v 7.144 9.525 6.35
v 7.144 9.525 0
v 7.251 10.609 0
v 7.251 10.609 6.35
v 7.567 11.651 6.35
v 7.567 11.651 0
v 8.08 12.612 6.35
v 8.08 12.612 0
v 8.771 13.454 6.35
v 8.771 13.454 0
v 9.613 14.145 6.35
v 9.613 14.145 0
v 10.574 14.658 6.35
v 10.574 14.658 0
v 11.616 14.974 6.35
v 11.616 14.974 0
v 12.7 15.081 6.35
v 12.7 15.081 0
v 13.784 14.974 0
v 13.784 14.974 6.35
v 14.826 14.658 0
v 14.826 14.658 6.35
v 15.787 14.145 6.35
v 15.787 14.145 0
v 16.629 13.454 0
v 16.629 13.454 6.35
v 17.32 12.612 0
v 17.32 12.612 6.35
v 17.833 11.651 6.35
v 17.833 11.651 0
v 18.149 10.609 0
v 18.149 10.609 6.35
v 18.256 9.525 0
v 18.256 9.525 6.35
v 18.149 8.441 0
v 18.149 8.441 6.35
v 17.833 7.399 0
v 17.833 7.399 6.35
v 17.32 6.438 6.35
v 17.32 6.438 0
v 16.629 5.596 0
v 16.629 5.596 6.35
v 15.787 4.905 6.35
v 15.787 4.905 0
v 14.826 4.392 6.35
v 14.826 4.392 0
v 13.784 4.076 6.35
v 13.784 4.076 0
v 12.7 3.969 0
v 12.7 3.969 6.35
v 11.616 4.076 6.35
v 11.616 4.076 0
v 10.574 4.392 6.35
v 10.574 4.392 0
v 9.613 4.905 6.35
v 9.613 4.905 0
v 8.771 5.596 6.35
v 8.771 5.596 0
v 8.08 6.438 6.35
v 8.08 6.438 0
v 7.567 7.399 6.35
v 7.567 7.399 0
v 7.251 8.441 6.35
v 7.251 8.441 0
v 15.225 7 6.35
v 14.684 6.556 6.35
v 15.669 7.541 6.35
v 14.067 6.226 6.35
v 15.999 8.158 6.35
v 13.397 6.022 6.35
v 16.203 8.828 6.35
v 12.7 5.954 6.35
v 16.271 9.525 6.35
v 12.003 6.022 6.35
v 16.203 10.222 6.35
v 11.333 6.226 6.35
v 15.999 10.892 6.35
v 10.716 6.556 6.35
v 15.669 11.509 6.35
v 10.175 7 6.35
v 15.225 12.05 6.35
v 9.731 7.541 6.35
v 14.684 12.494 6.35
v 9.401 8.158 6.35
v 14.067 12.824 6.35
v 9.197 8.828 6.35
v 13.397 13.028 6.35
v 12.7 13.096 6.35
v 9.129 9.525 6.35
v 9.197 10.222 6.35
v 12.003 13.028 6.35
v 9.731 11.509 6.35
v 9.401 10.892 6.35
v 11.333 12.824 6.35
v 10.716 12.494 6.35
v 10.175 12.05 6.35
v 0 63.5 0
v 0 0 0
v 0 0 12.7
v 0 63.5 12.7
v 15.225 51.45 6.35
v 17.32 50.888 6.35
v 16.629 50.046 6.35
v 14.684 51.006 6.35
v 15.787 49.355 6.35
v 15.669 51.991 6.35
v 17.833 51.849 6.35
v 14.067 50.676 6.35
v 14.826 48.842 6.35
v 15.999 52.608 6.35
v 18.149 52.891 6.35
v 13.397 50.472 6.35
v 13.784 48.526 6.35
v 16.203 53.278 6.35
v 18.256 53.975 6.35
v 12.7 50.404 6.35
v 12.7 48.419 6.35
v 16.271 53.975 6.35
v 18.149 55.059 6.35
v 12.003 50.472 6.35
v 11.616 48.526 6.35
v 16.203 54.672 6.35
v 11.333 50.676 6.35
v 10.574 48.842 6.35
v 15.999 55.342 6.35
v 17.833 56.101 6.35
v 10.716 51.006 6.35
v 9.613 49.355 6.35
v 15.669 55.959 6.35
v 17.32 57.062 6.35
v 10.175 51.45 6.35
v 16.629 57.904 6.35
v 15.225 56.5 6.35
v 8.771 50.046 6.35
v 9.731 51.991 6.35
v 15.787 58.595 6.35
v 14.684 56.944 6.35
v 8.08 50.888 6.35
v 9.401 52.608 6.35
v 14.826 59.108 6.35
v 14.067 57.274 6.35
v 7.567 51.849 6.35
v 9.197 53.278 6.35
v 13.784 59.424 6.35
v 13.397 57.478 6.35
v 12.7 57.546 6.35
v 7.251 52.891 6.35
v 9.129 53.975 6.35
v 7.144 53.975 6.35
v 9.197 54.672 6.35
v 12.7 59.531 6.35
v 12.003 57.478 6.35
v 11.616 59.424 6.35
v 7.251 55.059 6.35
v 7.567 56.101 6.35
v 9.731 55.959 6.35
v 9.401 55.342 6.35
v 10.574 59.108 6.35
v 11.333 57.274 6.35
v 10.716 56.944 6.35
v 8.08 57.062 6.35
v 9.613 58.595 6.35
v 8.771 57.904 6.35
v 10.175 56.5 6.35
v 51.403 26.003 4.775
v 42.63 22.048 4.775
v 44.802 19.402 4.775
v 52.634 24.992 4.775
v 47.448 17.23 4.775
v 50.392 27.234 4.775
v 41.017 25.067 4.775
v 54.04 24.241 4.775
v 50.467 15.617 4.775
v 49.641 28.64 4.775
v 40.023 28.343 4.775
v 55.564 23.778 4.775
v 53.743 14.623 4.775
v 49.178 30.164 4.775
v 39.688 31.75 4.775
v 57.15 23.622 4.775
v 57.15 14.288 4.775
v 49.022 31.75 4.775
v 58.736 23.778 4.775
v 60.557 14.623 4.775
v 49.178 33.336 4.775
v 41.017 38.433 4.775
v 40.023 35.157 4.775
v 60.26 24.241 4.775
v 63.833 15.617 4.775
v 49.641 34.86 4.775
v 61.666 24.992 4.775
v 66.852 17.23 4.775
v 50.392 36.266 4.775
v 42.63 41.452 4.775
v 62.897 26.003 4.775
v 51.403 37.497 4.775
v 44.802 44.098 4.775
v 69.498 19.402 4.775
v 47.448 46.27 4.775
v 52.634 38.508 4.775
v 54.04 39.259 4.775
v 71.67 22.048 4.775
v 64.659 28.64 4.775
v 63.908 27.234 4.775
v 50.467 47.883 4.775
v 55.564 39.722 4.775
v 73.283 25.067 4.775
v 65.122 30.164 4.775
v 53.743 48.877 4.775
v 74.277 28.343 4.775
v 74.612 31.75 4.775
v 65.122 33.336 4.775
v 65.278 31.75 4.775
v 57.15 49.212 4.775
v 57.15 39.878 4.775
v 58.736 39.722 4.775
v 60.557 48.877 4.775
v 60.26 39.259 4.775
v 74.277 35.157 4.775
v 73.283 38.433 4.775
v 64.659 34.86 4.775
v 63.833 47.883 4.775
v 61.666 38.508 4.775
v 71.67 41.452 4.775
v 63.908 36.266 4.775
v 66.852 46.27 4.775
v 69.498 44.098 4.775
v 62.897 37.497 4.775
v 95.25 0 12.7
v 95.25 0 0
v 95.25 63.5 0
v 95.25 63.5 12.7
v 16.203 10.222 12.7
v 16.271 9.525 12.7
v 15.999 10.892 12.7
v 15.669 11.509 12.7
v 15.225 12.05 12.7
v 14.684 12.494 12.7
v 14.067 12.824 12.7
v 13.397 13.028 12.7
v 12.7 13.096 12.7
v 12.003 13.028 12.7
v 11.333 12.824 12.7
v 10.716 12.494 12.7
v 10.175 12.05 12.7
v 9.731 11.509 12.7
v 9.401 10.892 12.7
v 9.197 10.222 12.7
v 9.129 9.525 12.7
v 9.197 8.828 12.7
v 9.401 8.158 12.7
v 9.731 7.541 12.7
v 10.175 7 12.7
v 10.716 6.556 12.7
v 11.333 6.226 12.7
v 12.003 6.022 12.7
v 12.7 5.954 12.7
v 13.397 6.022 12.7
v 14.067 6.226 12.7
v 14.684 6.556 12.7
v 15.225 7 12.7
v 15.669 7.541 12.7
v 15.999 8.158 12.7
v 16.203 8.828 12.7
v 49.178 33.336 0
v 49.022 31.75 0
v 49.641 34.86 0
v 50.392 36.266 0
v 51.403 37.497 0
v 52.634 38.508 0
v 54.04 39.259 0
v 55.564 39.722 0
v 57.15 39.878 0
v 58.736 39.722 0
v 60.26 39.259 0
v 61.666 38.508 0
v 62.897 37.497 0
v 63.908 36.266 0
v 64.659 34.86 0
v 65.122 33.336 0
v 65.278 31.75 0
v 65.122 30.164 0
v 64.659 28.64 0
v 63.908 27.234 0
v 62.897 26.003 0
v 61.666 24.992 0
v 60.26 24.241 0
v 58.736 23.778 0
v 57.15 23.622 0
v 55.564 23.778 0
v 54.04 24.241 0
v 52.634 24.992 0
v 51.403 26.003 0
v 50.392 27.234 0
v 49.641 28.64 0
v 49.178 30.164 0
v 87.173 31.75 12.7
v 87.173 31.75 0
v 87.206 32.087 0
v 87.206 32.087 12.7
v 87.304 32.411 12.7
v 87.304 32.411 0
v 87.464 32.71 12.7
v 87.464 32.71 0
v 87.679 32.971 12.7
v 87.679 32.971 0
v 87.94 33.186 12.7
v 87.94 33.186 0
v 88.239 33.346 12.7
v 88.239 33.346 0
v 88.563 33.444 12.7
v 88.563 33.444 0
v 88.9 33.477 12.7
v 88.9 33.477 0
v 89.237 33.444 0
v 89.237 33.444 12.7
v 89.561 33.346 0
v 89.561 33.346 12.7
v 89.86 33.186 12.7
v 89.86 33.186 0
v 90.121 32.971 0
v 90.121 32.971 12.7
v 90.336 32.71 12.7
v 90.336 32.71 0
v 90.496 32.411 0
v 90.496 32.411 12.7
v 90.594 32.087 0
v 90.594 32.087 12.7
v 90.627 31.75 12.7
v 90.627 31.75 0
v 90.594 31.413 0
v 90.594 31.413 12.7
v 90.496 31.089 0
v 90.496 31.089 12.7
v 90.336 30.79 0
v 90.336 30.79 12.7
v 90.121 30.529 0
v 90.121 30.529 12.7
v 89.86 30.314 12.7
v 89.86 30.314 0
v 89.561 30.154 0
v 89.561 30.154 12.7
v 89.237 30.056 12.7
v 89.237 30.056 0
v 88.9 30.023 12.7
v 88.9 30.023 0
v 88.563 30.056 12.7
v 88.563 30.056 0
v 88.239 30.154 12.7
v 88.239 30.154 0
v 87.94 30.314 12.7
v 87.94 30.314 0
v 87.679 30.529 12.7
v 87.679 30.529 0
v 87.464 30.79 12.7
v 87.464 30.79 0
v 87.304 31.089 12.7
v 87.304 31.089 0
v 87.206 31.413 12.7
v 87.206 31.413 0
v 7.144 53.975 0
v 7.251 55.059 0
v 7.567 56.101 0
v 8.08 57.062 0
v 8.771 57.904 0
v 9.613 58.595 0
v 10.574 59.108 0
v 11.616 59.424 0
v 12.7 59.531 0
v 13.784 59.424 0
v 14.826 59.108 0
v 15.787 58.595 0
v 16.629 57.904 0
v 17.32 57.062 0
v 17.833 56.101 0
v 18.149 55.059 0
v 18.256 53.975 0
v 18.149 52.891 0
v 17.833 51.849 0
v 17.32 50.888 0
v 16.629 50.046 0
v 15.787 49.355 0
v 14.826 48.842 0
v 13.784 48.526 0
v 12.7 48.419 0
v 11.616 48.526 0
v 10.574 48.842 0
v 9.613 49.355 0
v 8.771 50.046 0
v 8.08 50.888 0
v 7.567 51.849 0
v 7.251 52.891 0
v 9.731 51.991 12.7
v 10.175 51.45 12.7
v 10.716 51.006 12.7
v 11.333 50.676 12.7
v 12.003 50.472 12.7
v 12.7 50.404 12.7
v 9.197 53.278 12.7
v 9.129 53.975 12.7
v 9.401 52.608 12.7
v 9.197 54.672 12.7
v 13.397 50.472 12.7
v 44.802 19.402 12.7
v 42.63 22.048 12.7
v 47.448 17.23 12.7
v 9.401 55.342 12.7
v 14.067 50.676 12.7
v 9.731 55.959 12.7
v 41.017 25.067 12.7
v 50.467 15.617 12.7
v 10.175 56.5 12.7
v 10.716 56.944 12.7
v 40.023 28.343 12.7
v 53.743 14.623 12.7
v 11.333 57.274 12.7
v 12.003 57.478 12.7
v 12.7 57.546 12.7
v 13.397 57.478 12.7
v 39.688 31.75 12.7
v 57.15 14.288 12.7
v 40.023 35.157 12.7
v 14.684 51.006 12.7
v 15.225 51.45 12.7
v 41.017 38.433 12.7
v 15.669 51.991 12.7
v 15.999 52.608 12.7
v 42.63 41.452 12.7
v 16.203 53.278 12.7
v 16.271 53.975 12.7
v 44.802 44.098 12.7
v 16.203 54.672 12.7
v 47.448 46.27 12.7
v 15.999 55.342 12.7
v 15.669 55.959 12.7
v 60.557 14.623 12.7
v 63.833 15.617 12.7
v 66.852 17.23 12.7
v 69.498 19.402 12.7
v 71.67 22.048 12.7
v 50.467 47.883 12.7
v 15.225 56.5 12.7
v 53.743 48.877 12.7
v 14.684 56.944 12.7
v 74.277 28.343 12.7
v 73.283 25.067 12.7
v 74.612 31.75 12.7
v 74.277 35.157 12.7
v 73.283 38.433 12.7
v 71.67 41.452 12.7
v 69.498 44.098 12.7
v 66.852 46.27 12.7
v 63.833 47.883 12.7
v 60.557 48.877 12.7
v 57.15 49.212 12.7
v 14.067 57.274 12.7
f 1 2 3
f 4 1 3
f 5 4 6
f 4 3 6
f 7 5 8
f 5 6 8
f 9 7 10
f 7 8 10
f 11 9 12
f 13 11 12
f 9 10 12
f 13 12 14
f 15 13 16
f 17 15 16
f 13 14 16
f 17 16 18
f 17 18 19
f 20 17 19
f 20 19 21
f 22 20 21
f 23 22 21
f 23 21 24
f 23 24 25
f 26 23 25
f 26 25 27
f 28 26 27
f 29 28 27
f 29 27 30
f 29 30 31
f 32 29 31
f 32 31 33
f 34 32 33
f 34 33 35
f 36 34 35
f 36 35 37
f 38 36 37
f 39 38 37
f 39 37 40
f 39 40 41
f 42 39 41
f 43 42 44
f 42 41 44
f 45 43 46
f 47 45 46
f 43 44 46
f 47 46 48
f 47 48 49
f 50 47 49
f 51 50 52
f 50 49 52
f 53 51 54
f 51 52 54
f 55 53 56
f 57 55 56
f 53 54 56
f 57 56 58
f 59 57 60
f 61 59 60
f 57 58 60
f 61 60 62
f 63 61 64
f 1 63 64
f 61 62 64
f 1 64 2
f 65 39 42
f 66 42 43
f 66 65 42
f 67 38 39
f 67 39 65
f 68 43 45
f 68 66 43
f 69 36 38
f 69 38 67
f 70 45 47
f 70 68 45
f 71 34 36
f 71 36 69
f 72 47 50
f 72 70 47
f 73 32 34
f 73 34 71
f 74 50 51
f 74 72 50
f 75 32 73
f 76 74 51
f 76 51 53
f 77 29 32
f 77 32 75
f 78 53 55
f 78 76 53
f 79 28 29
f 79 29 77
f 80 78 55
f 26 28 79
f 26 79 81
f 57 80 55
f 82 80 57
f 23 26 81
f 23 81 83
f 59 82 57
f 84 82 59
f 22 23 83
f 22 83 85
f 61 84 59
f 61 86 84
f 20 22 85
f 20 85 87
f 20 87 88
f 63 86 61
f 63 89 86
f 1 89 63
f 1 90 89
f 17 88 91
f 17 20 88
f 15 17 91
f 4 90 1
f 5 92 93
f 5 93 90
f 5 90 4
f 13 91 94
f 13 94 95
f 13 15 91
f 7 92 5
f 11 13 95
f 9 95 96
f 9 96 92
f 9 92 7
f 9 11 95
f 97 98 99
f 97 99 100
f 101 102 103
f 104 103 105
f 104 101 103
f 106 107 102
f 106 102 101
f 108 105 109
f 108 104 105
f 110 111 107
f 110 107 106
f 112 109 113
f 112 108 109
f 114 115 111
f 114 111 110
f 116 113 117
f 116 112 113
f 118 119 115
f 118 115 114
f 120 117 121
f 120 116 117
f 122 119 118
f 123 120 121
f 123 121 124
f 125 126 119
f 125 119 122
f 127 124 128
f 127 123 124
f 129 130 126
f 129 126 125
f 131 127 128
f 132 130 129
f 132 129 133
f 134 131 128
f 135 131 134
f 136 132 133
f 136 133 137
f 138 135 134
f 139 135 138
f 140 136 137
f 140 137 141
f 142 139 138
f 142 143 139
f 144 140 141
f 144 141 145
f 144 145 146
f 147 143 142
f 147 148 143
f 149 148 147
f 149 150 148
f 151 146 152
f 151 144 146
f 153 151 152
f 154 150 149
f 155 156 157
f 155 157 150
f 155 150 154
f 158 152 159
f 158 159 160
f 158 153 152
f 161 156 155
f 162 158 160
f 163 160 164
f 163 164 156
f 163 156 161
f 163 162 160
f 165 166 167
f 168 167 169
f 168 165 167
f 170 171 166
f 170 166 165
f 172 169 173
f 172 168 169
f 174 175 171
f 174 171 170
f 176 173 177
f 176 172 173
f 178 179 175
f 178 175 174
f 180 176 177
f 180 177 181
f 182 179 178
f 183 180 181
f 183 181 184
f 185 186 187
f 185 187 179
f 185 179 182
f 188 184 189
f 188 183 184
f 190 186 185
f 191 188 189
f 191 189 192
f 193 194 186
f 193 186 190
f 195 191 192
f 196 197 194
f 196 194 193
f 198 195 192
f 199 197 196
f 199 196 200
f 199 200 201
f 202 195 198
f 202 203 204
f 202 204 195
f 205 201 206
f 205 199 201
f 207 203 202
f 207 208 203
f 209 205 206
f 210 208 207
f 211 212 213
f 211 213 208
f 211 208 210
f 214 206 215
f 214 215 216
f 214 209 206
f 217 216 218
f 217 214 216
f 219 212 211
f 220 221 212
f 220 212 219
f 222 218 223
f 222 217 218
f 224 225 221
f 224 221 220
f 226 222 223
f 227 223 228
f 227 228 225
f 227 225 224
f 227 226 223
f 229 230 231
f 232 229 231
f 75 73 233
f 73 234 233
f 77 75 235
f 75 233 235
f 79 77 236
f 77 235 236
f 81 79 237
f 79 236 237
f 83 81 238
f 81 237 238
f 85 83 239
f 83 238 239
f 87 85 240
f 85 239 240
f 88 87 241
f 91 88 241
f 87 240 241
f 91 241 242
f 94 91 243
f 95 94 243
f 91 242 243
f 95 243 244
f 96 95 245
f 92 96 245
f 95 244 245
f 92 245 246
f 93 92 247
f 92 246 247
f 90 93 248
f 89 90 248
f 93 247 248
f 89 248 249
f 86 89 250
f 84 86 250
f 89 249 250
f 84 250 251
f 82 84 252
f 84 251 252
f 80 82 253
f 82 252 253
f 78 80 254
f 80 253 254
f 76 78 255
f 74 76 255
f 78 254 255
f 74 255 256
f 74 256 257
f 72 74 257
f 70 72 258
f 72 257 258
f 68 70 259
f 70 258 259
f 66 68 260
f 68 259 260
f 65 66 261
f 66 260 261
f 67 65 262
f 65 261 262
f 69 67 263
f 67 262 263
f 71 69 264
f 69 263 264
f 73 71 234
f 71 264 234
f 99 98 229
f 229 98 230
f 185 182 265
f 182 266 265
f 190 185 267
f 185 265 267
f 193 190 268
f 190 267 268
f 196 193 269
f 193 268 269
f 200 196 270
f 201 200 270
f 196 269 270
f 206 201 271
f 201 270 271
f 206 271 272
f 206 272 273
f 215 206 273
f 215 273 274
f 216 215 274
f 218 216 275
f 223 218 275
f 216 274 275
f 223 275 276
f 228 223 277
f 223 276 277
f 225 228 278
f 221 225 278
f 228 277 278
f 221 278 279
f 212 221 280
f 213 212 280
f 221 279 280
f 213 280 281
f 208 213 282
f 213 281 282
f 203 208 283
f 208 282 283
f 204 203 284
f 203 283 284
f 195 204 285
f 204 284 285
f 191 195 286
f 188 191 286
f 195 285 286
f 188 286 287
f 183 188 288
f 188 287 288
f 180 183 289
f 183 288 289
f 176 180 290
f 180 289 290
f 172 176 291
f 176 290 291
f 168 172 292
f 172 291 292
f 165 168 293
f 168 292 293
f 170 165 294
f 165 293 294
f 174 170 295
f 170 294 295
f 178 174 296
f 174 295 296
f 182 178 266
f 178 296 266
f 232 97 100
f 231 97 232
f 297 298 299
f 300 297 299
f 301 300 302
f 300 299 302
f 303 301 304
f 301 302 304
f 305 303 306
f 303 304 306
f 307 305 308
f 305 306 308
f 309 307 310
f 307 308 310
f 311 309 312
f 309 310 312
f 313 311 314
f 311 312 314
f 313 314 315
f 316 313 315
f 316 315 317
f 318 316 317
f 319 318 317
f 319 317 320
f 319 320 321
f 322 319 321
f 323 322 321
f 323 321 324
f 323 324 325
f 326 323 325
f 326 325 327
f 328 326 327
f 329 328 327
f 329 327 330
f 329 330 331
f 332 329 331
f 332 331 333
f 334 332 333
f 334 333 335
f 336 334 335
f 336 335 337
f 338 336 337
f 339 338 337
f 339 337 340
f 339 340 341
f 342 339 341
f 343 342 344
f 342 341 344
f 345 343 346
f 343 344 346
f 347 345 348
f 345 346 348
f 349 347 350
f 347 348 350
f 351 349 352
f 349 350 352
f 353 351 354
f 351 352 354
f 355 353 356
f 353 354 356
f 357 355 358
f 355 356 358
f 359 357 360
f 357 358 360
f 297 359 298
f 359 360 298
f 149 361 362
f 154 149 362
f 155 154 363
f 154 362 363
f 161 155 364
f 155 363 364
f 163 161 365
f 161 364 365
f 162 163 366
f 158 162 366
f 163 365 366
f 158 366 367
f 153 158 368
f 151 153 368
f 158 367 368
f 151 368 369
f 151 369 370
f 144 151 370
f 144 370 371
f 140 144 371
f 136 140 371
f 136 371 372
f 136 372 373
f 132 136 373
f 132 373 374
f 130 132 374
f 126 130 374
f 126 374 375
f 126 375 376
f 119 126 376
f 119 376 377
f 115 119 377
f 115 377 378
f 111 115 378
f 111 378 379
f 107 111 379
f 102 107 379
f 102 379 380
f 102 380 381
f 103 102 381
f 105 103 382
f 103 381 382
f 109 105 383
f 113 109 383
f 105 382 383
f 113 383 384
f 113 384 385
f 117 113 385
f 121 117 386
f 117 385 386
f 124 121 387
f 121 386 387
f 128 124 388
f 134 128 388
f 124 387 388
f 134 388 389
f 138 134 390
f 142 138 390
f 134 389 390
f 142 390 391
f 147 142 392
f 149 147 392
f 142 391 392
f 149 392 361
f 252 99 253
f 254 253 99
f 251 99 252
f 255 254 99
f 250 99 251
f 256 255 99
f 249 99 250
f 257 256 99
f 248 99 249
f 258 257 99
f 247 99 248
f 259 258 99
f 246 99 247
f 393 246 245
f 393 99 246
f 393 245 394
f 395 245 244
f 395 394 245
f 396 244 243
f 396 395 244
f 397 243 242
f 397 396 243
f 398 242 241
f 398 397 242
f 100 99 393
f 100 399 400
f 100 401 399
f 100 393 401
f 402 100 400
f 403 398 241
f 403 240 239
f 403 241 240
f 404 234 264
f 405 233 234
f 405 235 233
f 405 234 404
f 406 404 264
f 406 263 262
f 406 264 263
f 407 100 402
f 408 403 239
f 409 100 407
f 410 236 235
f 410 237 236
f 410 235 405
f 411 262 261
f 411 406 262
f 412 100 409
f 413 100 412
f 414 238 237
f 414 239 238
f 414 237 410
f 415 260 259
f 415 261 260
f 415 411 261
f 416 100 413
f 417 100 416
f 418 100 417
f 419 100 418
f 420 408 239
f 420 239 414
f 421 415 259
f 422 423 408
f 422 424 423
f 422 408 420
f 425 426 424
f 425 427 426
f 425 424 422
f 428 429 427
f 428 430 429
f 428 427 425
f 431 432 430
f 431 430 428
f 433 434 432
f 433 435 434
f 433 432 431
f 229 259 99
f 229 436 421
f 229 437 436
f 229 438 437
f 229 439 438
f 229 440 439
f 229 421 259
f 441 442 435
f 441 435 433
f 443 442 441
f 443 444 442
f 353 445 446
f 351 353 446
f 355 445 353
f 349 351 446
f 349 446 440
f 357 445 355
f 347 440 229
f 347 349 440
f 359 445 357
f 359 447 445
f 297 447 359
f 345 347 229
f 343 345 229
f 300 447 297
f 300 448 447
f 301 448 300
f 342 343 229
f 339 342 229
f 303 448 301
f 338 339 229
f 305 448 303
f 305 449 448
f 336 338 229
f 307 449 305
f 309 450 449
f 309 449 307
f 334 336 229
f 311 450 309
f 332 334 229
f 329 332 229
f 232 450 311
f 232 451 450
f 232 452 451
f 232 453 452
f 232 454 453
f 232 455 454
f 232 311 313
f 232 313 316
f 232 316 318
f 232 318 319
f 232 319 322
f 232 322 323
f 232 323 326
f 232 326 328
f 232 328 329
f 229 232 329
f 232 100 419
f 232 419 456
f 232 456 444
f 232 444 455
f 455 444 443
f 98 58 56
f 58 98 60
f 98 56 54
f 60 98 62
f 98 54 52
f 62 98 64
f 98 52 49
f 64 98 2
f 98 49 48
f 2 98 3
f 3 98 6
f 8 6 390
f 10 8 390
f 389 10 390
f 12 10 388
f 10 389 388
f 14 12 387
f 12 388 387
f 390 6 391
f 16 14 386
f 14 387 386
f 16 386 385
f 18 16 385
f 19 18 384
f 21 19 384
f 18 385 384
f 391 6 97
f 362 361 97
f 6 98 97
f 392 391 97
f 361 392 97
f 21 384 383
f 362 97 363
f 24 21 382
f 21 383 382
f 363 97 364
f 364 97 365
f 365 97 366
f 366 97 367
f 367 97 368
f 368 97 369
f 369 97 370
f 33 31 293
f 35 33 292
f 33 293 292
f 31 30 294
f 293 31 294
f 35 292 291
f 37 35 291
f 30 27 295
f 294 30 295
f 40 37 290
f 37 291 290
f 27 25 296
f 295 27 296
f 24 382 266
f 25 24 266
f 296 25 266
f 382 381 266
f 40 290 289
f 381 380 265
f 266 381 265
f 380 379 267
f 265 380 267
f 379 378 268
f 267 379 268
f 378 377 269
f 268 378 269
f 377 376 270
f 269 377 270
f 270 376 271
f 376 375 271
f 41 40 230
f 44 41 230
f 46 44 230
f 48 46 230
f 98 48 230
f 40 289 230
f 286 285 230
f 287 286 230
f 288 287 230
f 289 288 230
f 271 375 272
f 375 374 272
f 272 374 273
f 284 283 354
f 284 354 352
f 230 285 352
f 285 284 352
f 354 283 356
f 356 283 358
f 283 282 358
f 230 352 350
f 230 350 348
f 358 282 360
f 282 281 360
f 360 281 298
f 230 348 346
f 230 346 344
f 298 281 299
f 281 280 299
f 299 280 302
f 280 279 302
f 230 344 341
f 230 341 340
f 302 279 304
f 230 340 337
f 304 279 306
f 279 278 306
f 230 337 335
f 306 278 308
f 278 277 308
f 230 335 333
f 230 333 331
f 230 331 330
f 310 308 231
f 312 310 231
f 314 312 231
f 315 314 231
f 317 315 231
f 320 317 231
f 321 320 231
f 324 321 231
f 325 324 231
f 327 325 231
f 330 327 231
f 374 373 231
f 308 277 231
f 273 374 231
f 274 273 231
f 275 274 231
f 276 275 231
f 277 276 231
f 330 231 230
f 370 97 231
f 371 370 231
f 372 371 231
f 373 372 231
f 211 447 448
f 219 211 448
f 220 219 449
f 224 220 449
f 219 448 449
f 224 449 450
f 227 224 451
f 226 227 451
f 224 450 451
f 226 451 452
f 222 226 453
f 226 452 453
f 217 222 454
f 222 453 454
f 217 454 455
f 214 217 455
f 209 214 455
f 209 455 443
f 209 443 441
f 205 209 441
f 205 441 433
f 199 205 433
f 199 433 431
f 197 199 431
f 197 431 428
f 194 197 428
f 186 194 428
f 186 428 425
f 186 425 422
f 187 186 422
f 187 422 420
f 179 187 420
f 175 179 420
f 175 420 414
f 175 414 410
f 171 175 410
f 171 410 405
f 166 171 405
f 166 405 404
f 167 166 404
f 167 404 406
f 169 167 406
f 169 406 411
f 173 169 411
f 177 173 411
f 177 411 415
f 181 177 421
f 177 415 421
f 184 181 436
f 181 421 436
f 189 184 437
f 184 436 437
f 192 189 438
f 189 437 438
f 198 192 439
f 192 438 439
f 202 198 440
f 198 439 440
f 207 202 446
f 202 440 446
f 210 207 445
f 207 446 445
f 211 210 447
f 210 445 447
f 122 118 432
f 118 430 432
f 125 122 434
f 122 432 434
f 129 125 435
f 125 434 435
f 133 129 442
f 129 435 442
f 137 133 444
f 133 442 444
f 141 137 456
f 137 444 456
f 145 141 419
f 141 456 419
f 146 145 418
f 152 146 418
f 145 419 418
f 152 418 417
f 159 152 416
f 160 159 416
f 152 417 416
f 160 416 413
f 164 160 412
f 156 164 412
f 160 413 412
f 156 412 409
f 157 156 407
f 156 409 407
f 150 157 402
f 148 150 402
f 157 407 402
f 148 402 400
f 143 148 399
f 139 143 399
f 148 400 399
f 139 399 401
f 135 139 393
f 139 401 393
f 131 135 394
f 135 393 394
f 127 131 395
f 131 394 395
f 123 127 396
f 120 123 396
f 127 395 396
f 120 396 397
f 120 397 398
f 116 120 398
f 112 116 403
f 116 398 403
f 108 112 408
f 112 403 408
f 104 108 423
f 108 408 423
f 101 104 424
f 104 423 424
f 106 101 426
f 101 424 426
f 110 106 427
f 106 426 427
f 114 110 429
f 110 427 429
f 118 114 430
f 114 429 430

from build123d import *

# Parameters (mm, degrees)
SKETCH1_W                                        = 95.25
SKETCH1_H                                        = 63.5
BOSS_EXTRUDE1_DEPTH                              = 12.7
CBORE_FOR_1_4_SOCKET_HEAD_CAP_SCREW1_D           = 7.14248
CBORE_FOR_1_4_SOCKET_HEAD_CAP_SCREW1_CBORE_D     = 11.1125
CBORE_FOR_1_4_SOCKET_HEAD_CAP_SCREW1_CBORE_DEPTH = 6.35
CBORE_FOR_5_8_SOCKET_HEAD_CAP_SCREW1_D           = 16.256
CBORE_FOR_5_8_SOCKET_HEAD_CAP_SCREW1_CBORE_D     = 34.925
CBORE_FOR_5_8_SOCKET_HEAD_CAP_SCREW1_CBORE_DEPTH = 7.9248
F_8_32_TAPPED_HOLE1_D                            = 3.4544


with BuildPart() as part:
    # Sketch1 → Boss-Extrude1 (new body)
    with BuildSketch(Plane.XY):
        with Locations((47.625, 31.75)):
            Rectangle(SKETCH1_W, SKETCH1_H)
    extrude(amount=BOSS_EXTRUDE1_DEPTH)

    # CBORE for 1/4 Socket Head Cap Screw1 (through all)
    with Locations(Plane(origin=(0, 0, 0), x_dir=(-1, 0, 0), z_dir=(0, 0, -1))):
        with Locations((-12.7, 53.975), (-12.7, 9.525)):
            CounterBoreHole(CBORE_FOR_1_4_SOCKET_HEAD_CAP_SCREW1_D / 2, CBORE_FOR_1_4_SOCKET_HEAD_CAP_SCREW1_CBORE_D / 2, CBORE_FOR_1_4_SOCKET_HEAD_CAP_SCREW1_CBORE_DEPTH)

    # CBORE for 5/8 Socket Head Cap Screw1 (through all)
    with Locations(Plane.XY.offset(12.7)):
        with Locations((57.15, 31.75)):
            CounterBoreHole(CBORE_FOR_5_8_SOCKET_HEAD_CAP_SCREW1_D / 2, CBORE_FOR_5_8_SOCKET_HEAD_CAP_SCREW1_CBORE_D / 2, CBORE_FOR_5_8_SOCKET_HEAD_CAP_SCREW1_CBORE_DEPTH)

    # #8-32 Tapped Hole1 (through all)
    with Locations(Plane.XY.offset(12.7)):
        with Locations((88.9, 31.75)):
            Hole(F_8_32_TAPPED_HOLE1_D / 2)


solid = part.part
